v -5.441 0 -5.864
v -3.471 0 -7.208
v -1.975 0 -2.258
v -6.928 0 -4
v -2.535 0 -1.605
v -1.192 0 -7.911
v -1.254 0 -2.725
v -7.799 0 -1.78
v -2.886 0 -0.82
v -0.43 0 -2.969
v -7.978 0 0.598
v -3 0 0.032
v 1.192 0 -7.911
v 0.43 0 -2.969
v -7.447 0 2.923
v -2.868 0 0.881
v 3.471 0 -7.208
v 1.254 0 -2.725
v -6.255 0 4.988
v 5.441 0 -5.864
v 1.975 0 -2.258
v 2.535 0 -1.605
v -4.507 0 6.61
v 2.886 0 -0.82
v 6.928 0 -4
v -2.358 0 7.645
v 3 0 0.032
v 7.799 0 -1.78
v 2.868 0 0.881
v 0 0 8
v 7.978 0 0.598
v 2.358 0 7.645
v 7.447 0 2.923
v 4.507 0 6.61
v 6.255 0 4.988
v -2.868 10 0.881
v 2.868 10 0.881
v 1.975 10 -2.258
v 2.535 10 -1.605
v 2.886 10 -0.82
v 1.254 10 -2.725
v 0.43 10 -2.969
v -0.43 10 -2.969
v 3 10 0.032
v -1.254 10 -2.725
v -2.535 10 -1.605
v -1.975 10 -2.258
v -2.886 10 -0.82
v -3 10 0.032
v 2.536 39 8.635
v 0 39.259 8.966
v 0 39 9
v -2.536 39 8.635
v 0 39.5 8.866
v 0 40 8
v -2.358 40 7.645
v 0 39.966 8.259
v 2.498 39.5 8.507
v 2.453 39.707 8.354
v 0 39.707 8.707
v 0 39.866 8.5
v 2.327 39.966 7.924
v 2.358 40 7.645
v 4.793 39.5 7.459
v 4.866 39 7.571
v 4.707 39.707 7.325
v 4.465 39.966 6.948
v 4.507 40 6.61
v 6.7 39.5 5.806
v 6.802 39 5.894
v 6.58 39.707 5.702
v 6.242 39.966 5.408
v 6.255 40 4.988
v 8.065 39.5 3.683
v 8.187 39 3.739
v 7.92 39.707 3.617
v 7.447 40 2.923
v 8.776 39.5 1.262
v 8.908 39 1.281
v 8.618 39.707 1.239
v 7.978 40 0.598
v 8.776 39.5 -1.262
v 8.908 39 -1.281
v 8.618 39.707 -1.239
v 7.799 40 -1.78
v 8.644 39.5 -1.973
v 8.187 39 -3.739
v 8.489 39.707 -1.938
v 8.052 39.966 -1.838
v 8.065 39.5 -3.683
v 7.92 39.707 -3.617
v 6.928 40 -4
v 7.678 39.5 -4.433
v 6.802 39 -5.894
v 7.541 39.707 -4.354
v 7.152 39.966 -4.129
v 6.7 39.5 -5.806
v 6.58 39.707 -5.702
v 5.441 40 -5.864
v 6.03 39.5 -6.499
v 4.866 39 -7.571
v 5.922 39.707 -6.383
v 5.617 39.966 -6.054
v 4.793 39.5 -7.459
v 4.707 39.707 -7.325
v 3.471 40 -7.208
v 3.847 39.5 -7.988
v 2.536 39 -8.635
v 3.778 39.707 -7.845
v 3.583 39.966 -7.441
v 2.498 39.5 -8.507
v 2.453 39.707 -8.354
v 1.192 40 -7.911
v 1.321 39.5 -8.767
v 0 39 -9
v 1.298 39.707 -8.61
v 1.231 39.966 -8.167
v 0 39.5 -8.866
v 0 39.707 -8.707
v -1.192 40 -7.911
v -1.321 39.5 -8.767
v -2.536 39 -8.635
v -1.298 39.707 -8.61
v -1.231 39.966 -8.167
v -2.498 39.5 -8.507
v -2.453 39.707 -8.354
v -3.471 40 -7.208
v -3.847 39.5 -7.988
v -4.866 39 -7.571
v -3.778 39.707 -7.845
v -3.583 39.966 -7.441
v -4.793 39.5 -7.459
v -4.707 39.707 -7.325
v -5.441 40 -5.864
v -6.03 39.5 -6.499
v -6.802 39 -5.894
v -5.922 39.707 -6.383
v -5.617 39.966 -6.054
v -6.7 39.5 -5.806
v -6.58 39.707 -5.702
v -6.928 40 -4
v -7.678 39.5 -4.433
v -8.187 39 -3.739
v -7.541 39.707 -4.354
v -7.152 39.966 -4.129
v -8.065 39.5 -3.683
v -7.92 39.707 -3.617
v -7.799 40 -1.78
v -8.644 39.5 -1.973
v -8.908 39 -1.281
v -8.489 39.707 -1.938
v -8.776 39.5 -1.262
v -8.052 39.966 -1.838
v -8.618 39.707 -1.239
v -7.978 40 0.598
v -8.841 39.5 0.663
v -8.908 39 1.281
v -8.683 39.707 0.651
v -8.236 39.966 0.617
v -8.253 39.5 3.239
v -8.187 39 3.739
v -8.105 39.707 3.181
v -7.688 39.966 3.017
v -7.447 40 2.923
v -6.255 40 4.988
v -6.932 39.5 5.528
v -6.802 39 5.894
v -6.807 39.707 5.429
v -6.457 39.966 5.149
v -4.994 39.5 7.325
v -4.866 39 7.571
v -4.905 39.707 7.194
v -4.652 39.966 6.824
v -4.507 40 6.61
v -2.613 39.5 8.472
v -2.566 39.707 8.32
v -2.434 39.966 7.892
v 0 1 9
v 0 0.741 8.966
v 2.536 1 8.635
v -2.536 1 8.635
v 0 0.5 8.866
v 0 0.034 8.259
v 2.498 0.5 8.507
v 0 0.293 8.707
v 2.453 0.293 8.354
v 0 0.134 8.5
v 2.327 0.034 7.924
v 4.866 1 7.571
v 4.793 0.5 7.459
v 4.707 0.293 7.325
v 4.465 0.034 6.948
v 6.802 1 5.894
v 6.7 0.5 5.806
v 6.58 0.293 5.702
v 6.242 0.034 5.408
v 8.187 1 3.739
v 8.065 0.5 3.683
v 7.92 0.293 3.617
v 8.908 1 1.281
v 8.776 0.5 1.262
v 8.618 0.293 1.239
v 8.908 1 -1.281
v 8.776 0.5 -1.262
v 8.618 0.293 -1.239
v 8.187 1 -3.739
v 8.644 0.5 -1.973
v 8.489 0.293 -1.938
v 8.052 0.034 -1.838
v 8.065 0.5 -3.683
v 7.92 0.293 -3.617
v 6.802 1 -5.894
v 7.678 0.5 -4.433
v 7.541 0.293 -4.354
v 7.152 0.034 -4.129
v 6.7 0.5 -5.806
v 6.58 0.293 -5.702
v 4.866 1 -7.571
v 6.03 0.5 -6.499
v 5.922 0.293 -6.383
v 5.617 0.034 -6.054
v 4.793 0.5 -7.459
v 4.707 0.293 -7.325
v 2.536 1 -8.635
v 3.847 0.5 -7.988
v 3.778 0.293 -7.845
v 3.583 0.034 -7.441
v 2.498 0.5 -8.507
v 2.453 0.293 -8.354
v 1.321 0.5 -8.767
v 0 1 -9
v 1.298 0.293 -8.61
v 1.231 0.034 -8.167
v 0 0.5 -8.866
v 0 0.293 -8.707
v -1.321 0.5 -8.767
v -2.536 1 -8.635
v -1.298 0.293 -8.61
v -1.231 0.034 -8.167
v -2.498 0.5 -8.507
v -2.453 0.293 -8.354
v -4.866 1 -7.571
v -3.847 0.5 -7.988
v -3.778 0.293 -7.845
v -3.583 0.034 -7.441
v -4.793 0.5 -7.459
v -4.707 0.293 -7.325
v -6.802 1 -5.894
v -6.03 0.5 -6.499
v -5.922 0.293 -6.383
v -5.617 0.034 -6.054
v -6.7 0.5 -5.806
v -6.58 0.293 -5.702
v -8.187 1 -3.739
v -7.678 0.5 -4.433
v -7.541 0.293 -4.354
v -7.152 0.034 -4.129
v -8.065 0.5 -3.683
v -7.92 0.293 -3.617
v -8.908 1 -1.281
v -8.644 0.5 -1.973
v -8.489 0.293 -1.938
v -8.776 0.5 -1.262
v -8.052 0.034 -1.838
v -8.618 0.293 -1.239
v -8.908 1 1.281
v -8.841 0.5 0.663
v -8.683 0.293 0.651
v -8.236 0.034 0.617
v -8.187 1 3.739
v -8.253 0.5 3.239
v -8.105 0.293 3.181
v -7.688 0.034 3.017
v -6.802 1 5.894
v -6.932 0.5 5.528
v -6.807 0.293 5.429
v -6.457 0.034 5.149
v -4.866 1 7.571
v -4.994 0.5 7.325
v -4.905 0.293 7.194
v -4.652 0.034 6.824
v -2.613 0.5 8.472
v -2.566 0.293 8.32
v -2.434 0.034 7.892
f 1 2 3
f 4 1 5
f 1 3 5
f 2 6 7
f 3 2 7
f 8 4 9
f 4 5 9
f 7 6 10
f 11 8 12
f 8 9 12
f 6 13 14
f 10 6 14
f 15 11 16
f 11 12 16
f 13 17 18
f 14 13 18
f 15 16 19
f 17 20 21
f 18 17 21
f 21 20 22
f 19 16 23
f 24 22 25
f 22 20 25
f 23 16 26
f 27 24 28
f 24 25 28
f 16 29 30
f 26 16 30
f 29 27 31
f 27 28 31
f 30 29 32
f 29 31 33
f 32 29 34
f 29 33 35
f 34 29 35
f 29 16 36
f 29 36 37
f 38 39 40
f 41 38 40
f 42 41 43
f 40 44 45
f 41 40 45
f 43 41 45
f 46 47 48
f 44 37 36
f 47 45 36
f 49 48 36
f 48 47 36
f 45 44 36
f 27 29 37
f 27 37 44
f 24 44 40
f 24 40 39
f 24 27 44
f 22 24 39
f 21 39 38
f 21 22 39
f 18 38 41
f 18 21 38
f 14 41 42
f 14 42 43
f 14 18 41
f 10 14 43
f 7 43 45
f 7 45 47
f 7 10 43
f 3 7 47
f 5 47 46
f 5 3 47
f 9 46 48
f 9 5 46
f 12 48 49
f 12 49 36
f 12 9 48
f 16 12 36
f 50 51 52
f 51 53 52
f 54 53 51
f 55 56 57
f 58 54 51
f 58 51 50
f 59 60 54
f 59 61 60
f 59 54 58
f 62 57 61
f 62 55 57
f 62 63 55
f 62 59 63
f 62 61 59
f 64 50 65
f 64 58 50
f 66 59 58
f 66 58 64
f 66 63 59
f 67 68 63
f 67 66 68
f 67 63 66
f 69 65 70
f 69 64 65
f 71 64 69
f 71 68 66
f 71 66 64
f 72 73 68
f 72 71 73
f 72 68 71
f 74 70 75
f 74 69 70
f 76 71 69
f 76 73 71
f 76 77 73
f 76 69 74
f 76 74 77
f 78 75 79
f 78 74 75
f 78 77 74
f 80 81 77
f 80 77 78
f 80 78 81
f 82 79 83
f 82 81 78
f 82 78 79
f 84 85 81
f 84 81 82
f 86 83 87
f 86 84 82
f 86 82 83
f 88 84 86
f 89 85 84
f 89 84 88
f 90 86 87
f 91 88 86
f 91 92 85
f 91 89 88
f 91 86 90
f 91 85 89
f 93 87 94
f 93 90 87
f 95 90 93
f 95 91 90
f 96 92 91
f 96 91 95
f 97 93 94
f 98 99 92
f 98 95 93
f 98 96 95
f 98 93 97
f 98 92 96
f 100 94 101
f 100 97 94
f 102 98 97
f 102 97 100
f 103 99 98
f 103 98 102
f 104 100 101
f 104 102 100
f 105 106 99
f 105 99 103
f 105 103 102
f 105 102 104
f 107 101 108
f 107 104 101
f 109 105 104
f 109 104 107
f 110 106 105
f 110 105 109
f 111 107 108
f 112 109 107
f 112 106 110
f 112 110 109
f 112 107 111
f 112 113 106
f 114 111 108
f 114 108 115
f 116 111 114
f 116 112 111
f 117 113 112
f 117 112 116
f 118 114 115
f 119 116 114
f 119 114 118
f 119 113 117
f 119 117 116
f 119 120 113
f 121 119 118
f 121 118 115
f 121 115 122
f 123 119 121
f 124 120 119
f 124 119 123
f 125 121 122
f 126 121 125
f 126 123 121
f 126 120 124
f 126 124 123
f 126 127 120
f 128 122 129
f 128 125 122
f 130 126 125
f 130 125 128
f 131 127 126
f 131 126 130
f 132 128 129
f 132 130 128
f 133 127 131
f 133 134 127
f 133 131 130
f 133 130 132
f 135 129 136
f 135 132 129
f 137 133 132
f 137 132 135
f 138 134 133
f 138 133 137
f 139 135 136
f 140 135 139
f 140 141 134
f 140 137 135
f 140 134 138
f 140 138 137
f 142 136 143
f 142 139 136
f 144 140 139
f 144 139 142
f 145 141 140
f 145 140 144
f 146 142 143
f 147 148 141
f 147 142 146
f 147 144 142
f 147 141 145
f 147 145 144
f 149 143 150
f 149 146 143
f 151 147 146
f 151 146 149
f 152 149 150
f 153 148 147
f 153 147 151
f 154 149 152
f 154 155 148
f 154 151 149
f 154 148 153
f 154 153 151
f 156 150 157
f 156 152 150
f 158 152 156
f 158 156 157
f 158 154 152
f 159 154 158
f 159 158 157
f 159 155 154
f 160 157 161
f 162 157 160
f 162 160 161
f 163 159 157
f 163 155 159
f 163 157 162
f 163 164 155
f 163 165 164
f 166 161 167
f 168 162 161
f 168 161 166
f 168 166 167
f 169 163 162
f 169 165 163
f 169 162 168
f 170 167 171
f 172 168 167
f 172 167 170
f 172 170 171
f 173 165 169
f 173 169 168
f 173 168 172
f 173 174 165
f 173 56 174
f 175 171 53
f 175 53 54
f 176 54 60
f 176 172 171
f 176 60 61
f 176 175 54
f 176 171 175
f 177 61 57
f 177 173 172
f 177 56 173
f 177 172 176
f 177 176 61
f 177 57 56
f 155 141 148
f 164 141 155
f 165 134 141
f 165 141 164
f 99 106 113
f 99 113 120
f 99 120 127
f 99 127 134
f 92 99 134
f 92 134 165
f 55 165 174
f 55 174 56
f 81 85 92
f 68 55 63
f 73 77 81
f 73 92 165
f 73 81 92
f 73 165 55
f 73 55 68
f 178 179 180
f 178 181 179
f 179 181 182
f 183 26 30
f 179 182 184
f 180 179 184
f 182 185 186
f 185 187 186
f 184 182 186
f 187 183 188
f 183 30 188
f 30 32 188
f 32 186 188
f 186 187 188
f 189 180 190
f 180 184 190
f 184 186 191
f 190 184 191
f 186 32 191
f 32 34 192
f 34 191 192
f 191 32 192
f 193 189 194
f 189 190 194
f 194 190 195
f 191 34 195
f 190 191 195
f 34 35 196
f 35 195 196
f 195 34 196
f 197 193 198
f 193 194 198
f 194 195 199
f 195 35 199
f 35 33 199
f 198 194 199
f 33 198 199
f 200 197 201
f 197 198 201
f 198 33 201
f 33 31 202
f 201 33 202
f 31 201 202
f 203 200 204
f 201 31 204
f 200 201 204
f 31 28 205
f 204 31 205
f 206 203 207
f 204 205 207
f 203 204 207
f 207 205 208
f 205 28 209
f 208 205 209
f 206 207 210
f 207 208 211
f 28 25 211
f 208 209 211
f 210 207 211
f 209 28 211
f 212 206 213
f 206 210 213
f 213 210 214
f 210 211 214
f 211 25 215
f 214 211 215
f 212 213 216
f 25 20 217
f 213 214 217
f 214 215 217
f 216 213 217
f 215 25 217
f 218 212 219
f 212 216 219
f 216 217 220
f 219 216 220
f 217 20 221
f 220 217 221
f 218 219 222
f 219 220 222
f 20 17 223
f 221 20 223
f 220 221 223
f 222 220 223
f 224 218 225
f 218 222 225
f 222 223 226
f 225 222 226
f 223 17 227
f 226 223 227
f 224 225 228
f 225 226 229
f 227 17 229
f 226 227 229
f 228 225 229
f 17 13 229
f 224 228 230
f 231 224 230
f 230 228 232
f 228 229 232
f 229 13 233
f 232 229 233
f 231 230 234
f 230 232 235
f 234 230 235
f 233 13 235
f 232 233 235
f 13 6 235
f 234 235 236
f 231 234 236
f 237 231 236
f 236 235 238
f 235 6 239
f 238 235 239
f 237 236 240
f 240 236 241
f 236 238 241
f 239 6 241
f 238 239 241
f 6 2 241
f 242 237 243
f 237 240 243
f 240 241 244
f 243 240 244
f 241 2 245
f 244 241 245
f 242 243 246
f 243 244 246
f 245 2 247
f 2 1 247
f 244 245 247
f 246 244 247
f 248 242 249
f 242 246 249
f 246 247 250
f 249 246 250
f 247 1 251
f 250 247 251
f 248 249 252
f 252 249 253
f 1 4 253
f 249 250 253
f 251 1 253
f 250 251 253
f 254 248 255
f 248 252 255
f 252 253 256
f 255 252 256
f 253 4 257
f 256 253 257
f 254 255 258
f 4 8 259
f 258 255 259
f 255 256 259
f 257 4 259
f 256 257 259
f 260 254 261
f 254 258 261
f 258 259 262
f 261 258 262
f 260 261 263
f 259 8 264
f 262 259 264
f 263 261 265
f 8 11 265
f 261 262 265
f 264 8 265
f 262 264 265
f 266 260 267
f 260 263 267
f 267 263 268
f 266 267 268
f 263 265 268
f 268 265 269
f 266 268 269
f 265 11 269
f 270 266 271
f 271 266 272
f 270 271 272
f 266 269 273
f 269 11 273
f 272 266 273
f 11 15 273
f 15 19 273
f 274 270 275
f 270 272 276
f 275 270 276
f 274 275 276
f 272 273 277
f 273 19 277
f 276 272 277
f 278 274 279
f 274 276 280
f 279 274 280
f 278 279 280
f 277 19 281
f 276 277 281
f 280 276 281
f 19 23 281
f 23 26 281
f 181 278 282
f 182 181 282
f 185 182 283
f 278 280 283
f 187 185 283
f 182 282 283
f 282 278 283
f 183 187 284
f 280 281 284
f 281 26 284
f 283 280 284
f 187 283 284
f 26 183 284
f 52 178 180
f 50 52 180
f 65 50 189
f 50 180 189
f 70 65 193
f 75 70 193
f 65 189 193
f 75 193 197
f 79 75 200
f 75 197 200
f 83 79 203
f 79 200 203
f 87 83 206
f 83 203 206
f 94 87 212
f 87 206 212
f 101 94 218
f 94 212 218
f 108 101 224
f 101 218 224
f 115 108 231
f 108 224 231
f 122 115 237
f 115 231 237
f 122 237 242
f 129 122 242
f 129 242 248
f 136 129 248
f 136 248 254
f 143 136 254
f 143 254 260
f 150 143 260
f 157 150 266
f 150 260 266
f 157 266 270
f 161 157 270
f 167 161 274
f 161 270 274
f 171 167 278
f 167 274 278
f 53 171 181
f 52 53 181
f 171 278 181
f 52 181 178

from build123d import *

# Parameters (mm, degrees)
SKETCH2_R           = 9
BOSS_EXTRUDE1_DEPTH = 40
CUT_EXTRUDE1_DEPTH  = 10
FILLET1_R           = 1
FILLET2_R           = 1


with BuildPart() as part:
    # Sketch2 → Boss-Extrude1 (new body)
    with BuildSketch(Plane(origin=(0, 0, 0), x_dir=(1, 0, 0), z_dir=(0, 1, 0))):
        with Locations(Location((0, 0, 0), (0, 0, 270))):
            Circle(SKETCH2_R)
    extrude(amount=BOSS_EXTRUDE1_DEPTH)

    # Sketch4 → Cut-Extrude1 (cut)
    with BuildSketch(Plane.XZ):
        with BuildLine():
            Line((-2.867677405, 0.881150554), (2.867677405, 0.881150554))
            ThreePointArc((2.867677405, 0.881150554), (0, -3), (-2.867677405, 0.881150554))
        make_face()
    extrude(amount=-CUT_EXTRUDE1_DEPTH, mode=Mode.SUBTRACT)

    # Fillet1
    fillet1_edges = [part.edges().sort_by_distance(p)[0] for p in [
        (0, 0, -9),
    ]]
    fillet(fillet1_edges, radius=FILLET1_R)

    # Fillet2
    fillet2_edges = [part.edges().sort_by_distance(p)[0] for p in [
        (0, 40, -9),
    ]]
    fillet(fillet2_edges, radius=FILLET2_R)


solid = part.part
